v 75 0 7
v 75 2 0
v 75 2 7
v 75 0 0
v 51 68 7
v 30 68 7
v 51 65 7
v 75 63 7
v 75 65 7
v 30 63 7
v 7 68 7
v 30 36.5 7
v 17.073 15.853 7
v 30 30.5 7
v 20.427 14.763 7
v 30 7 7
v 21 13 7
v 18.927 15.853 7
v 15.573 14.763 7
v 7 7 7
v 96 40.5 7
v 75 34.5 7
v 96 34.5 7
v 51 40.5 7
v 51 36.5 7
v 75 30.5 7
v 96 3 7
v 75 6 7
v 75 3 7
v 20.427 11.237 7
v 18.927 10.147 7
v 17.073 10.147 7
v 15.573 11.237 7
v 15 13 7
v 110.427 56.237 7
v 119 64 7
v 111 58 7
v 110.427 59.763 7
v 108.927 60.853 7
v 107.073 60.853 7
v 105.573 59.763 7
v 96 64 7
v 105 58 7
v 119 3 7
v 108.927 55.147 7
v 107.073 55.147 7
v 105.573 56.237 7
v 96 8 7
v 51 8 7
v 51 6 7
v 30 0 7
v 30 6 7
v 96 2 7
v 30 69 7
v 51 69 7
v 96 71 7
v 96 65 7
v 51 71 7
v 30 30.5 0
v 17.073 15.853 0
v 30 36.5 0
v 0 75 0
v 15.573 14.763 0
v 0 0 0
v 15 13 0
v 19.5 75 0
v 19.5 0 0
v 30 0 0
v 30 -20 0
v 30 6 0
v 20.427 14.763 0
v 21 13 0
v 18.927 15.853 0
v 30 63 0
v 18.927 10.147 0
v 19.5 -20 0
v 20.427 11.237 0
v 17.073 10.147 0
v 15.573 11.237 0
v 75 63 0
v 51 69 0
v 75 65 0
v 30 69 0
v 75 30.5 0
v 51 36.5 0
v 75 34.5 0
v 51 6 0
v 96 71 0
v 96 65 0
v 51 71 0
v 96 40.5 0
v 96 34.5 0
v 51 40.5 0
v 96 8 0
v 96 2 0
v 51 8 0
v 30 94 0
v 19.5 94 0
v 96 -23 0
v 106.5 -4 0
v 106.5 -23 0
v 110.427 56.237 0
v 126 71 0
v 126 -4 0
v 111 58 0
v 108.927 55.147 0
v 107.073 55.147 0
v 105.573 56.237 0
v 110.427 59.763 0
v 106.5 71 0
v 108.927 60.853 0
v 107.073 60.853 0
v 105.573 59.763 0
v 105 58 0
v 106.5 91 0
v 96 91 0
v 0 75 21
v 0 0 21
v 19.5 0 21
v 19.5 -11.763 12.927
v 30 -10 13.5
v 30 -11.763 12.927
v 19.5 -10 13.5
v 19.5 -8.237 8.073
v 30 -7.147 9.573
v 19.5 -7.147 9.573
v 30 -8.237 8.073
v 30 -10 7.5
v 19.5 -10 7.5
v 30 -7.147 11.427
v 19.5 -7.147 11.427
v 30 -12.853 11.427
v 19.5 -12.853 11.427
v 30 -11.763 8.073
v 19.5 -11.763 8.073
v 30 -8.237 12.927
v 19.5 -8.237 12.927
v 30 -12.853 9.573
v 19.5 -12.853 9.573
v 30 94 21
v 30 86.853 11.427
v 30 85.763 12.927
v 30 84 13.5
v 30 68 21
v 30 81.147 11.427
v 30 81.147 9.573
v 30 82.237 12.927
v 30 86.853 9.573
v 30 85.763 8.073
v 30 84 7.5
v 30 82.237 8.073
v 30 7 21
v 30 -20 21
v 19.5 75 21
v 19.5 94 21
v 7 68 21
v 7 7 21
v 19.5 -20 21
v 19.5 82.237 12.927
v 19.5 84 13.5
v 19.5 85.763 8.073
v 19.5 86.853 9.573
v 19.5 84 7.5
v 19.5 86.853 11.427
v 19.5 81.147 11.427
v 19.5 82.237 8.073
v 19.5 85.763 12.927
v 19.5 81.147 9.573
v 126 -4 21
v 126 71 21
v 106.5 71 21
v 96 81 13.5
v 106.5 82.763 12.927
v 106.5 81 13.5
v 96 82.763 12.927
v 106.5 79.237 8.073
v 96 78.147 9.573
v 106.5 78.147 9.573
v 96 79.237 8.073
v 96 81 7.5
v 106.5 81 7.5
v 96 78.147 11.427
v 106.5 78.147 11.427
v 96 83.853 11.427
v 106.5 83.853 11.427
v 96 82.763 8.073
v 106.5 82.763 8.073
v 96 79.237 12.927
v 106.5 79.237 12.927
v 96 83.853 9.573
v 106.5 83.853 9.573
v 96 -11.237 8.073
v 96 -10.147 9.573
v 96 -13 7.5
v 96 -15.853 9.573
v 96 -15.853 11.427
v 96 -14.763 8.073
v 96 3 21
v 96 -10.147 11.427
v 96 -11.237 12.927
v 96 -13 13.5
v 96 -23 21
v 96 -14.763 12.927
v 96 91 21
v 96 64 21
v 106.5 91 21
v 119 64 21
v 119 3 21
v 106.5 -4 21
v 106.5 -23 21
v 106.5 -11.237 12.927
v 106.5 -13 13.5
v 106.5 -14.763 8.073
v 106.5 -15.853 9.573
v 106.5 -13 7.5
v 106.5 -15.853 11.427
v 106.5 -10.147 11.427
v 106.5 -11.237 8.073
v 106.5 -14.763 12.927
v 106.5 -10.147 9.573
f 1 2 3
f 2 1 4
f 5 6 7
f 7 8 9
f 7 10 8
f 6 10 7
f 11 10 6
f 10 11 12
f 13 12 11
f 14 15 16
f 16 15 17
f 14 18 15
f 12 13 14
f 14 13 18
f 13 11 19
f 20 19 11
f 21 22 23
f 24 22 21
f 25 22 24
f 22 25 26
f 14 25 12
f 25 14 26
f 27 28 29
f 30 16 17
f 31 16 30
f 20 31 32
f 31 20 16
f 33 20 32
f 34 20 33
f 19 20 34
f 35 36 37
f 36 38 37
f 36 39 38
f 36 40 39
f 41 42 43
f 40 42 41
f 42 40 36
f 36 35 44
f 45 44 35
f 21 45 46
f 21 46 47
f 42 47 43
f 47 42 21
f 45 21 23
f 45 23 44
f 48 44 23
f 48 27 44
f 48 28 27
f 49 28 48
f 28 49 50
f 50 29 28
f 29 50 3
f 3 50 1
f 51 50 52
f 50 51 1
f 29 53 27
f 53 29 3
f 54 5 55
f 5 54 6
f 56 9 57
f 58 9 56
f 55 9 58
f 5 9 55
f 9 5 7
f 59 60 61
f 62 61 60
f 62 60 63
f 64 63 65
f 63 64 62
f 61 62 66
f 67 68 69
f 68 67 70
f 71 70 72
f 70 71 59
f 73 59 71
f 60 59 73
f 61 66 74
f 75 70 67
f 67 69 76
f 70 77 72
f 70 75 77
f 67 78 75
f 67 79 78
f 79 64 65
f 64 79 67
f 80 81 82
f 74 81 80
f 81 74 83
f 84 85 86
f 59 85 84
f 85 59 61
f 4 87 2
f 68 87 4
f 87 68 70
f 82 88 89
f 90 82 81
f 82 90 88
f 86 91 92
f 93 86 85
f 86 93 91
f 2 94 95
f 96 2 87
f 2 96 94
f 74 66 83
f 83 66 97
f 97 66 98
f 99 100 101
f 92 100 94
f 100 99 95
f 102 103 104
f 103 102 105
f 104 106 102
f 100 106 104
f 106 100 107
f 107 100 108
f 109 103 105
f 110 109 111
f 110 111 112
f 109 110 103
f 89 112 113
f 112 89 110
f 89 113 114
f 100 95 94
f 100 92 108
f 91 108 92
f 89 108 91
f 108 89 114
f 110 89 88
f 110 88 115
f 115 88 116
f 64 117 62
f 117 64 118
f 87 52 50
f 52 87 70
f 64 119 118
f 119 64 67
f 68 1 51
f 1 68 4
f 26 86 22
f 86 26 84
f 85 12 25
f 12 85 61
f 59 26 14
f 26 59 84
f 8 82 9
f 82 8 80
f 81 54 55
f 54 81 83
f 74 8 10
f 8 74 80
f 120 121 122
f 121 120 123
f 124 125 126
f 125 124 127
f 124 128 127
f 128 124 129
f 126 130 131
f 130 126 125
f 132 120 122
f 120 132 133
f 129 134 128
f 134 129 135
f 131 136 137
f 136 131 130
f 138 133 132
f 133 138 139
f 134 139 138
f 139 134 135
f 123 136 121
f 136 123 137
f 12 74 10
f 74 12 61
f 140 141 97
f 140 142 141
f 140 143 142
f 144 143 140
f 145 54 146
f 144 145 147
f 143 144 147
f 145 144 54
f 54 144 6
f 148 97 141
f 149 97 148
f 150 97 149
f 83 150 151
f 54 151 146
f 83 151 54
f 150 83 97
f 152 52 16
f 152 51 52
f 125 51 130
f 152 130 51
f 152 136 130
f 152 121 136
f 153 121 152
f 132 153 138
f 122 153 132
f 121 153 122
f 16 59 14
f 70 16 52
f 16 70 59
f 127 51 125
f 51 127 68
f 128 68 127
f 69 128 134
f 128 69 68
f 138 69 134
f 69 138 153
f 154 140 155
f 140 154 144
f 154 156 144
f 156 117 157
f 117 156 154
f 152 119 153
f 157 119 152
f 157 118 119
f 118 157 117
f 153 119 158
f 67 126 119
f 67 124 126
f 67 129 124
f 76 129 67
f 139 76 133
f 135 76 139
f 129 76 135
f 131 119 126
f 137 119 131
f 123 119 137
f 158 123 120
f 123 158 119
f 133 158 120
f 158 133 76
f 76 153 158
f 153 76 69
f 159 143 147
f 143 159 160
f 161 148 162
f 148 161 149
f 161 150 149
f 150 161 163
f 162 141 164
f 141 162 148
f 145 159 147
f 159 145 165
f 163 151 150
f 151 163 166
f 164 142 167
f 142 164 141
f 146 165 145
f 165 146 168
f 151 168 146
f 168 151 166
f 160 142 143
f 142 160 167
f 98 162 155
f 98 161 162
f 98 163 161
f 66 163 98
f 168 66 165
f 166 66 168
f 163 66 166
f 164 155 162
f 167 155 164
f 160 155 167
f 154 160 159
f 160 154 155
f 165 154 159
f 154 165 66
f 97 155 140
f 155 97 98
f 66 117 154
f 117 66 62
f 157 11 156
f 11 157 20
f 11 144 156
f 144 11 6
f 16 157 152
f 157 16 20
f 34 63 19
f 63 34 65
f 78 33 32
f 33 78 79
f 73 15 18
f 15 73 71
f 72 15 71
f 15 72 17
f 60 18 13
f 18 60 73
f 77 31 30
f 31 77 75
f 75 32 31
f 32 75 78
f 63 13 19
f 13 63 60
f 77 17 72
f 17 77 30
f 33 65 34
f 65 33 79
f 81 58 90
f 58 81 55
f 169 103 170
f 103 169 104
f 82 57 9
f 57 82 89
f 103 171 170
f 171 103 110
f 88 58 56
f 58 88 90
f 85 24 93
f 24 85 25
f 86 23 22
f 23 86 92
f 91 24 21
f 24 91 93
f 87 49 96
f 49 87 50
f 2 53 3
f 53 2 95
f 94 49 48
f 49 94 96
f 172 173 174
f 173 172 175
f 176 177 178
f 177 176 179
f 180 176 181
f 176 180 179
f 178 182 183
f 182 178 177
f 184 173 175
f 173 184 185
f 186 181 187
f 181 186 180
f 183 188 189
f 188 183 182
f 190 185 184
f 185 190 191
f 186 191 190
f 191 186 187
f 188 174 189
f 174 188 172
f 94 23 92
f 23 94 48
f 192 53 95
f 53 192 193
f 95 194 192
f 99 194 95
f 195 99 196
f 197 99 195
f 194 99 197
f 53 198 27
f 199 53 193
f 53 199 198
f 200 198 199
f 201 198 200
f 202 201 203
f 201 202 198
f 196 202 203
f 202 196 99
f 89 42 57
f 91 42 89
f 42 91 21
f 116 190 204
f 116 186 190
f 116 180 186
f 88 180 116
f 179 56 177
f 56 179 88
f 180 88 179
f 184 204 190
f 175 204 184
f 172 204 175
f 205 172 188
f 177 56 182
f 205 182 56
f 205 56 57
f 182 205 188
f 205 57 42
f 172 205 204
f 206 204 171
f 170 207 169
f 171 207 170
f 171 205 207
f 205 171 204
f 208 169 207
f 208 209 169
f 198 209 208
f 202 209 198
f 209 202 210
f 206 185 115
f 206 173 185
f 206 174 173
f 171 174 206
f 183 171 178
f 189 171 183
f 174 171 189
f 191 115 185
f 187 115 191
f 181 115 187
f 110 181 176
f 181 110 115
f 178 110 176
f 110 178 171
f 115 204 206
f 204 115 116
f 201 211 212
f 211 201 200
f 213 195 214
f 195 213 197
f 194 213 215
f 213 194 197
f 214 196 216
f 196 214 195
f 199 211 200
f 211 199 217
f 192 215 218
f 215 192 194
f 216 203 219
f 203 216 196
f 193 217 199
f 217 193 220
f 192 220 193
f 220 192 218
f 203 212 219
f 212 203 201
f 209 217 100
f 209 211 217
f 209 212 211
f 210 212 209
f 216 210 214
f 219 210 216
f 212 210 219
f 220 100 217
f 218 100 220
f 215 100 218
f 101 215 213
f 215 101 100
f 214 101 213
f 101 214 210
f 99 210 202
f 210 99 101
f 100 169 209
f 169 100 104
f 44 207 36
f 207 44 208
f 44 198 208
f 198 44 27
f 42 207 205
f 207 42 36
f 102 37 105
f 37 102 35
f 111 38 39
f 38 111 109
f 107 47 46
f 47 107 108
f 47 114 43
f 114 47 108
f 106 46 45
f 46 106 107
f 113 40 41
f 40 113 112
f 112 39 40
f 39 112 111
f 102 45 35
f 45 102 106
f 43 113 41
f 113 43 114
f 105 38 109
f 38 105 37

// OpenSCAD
// file: hardware.scad
axle_r = 4.5;
axle_separation = 30;

module axle(h) {
	rotate(v=[-1,0,0], a=90) cylinder(r=axle_r, h=h, $fn=10);
}

module axlepair(h=100) {
	union() {
		axle(h);
		translate(v=[axle_separation, 0, 0]) axle(h);
	}
}

module m2(h=16) {
	union() {
		cylinder(r=2, h=2);
		cylinder(r=1.5, h=h);
	}
}

module m3(h=16) {
	union() {
		cylinder(r=3.25, h=3);
		cylinder(r=2, h=h);
	}
}

module m5(h=16) {
	union() {
		cylinder(r=4.5, h=5);
		cylinder(r=3, h=h);
	}
}
// file: droid.scad
droid_length = 116;
droid_width = 61;
droid_height = 14;

module droid() {
    union() {
	cube([droid_length, droid_width, droid_height]);
	translate(v=[11,6,-10]) cylinder(r=3, h=10);
    }
}
// main file
include <droid.scad>
use <hardware.scad>

module droidmount() {
		endcap_depth = 30;
		wall_thickness = 7;
		bar_thickness = 6;
		bar_length = droid_length / 2 + wall_thickness + 10;
		screw_plate_width = 20;
		height = droid_height + wall_thickness;
		echo("Total length:");
		echo(bar_length+wall_thickness);
		
		difference() {
				union() {
						// End caps
						cube([endcap_depth, droid_width + 2 * wall_thickness, height]);
						// Lower supports
						for (y = [0, droid_width / 2, droid_width - 2 * bar_thickness + wall_thickness * 2]) {
								translate(v=[0,y,0]) cube([bar_length, bar_thickness, wall_thickness]);
						}
						// Tension screw mounts
						for (y=[-screw_plate_width, droid_width + screw_plate_width - wall_thickness]) {
								translate(v=[endcap_depth - 1.5 * wall_thickness, y, 0]) {
										difference() {
												cube([1.5 * wall_thickness, screw_plate_width, height]);
												rotate(v=[0,1,0], 90) translate(v=[-height/2,screw_plate_width/2,-6]) m5(65);
										}
								}
						}
				}
				#translate(v=[wall_thickness, wall_thickness, height - droid_height]) droid();
		}
}

union() {
		droidmount();
		translate(v=[droid_length + 10, droid_width + 10, 0]) rotate(180) droidmount();
}
